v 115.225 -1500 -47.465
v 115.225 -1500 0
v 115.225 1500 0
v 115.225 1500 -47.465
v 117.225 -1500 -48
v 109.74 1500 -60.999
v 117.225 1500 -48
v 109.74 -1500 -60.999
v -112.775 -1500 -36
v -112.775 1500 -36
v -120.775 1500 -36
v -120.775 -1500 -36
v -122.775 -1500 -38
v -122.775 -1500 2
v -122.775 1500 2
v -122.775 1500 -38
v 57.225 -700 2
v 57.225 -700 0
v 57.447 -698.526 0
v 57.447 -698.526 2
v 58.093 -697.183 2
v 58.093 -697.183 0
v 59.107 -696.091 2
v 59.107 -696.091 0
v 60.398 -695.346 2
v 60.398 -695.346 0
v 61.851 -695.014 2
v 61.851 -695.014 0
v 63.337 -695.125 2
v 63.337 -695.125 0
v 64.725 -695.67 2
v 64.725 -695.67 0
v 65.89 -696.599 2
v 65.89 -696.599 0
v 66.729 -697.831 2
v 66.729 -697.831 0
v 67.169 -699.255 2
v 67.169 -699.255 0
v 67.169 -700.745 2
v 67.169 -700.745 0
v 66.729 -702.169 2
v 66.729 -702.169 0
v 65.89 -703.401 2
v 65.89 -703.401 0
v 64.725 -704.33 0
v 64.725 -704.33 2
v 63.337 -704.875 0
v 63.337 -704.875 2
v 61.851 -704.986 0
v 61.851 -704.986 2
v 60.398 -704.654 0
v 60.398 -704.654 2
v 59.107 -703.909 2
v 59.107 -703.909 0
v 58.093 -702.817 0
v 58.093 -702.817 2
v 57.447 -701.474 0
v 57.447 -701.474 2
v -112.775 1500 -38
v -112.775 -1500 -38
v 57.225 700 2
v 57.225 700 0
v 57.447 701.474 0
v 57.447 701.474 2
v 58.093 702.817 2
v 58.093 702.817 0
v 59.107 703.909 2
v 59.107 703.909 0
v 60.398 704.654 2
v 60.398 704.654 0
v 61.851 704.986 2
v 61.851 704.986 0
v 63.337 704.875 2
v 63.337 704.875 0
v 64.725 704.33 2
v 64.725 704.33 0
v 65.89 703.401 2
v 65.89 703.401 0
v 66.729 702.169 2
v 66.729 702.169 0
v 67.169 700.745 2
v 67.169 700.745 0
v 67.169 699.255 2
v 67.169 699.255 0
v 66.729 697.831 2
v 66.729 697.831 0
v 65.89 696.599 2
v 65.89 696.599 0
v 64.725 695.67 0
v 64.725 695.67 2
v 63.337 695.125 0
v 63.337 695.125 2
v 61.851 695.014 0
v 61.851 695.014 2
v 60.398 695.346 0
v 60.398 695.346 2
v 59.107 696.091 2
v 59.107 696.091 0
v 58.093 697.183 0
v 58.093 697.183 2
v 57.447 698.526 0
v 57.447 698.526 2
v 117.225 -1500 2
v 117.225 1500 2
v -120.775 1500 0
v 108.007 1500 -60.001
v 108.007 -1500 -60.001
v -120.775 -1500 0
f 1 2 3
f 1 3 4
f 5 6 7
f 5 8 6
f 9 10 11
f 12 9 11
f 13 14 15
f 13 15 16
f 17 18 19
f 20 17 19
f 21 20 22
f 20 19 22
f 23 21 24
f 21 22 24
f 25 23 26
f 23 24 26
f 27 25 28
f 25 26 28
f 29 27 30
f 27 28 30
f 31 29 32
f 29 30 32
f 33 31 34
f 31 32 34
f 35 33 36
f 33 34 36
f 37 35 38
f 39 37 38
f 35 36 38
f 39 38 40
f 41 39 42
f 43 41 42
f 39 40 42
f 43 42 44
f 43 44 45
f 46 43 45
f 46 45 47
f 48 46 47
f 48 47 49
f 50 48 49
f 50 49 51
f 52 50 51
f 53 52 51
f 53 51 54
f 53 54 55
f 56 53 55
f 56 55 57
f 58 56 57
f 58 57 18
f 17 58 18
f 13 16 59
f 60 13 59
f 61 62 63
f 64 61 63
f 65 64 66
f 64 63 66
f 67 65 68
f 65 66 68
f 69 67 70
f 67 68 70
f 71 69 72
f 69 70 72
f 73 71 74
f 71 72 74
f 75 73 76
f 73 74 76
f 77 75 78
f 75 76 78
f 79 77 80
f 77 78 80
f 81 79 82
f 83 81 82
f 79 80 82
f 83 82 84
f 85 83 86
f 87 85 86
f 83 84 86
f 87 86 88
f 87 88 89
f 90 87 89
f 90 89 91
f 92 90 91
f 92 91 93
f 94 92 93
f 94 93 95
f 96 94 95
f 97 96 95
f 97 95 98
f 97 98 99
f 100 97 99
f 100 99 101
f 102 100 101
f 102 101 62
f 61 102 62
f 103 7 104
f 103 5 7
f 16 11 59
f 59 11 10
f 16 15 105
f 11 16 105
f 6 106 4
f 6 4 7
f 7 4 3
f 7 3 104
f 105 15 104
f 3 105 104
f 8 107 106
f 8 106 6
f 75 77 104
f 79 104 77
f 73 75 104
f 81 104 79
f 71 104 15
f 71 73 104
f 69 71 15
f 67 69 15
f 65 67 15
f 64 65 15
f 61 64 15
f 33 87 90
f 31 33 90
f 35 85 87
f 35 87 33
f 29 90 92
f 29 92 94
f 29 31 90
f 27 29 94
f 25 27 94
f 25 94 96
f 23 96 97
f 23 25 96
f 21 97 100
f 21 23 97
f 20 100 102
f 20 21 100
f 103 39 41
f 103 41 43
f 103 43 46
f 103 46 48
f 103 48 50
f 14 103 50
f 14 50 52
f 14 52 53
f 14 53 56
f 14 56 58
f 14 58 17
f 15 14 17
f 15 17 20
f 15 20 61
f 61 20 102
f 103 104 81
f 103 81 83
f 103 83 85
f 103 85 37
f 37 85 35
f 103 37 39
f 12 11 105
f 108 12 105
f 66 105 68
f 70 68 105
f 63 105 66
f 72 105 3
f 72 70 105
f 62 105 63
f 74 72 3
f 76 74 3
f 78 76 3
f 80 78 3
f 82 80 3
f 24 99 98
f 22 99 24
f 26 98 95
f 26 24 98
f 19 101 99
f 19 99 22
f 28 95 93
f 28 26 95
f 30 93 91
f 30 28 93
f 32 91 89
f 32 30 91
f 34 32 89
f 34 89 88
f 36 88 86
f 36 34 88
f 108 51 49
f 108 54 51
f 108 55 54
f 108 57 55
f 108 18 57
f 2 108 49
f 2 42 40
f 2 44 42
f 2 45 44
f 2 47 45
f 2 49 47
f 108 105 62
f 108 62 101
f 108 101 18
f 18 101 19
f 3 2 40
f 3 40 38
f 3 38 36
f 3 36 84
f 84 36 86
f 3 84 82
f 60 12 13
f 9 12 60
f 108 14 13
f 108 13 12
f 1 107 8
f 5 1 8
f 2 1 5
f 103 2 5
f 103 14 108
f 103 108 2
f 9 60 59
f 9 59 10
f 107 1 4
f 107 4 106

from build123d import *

# Parameters (mm, degrees)
F1_DEPTH = 1500
F3_D     = 10


with BuildPart() as f1:
    # F0 (on Front) → F1 (new body, symmetric)
    with BuildSketch(Plane.XZ):
        Polygon((117.2245608195, 2), (-82.7754391805, 2), (-122.7754391805, 2), (-122.7754391805, -38), (-112.7754391805, -38), (-112.7754391805, -36), (-120.7754391805, -36), (-120.7754391805, 0), (-82.7754391805, 0), (115.2245608195, 0), (115.2245608195, -47.4653829816), (108.0068537776, -60.001411454), (109.7400990692, -60.9993396874), (117.2245608195, -48), align=None)
    extrude(amount=F1_DEPTH, both=True)

    # F3 (through all)
    with Locations(Plane.XY.offset(2)):
        with Locations((62.2245608195, -700), (62.2245608195, 700)):
            Hole(F3_D / 2)


solid = f1.part
